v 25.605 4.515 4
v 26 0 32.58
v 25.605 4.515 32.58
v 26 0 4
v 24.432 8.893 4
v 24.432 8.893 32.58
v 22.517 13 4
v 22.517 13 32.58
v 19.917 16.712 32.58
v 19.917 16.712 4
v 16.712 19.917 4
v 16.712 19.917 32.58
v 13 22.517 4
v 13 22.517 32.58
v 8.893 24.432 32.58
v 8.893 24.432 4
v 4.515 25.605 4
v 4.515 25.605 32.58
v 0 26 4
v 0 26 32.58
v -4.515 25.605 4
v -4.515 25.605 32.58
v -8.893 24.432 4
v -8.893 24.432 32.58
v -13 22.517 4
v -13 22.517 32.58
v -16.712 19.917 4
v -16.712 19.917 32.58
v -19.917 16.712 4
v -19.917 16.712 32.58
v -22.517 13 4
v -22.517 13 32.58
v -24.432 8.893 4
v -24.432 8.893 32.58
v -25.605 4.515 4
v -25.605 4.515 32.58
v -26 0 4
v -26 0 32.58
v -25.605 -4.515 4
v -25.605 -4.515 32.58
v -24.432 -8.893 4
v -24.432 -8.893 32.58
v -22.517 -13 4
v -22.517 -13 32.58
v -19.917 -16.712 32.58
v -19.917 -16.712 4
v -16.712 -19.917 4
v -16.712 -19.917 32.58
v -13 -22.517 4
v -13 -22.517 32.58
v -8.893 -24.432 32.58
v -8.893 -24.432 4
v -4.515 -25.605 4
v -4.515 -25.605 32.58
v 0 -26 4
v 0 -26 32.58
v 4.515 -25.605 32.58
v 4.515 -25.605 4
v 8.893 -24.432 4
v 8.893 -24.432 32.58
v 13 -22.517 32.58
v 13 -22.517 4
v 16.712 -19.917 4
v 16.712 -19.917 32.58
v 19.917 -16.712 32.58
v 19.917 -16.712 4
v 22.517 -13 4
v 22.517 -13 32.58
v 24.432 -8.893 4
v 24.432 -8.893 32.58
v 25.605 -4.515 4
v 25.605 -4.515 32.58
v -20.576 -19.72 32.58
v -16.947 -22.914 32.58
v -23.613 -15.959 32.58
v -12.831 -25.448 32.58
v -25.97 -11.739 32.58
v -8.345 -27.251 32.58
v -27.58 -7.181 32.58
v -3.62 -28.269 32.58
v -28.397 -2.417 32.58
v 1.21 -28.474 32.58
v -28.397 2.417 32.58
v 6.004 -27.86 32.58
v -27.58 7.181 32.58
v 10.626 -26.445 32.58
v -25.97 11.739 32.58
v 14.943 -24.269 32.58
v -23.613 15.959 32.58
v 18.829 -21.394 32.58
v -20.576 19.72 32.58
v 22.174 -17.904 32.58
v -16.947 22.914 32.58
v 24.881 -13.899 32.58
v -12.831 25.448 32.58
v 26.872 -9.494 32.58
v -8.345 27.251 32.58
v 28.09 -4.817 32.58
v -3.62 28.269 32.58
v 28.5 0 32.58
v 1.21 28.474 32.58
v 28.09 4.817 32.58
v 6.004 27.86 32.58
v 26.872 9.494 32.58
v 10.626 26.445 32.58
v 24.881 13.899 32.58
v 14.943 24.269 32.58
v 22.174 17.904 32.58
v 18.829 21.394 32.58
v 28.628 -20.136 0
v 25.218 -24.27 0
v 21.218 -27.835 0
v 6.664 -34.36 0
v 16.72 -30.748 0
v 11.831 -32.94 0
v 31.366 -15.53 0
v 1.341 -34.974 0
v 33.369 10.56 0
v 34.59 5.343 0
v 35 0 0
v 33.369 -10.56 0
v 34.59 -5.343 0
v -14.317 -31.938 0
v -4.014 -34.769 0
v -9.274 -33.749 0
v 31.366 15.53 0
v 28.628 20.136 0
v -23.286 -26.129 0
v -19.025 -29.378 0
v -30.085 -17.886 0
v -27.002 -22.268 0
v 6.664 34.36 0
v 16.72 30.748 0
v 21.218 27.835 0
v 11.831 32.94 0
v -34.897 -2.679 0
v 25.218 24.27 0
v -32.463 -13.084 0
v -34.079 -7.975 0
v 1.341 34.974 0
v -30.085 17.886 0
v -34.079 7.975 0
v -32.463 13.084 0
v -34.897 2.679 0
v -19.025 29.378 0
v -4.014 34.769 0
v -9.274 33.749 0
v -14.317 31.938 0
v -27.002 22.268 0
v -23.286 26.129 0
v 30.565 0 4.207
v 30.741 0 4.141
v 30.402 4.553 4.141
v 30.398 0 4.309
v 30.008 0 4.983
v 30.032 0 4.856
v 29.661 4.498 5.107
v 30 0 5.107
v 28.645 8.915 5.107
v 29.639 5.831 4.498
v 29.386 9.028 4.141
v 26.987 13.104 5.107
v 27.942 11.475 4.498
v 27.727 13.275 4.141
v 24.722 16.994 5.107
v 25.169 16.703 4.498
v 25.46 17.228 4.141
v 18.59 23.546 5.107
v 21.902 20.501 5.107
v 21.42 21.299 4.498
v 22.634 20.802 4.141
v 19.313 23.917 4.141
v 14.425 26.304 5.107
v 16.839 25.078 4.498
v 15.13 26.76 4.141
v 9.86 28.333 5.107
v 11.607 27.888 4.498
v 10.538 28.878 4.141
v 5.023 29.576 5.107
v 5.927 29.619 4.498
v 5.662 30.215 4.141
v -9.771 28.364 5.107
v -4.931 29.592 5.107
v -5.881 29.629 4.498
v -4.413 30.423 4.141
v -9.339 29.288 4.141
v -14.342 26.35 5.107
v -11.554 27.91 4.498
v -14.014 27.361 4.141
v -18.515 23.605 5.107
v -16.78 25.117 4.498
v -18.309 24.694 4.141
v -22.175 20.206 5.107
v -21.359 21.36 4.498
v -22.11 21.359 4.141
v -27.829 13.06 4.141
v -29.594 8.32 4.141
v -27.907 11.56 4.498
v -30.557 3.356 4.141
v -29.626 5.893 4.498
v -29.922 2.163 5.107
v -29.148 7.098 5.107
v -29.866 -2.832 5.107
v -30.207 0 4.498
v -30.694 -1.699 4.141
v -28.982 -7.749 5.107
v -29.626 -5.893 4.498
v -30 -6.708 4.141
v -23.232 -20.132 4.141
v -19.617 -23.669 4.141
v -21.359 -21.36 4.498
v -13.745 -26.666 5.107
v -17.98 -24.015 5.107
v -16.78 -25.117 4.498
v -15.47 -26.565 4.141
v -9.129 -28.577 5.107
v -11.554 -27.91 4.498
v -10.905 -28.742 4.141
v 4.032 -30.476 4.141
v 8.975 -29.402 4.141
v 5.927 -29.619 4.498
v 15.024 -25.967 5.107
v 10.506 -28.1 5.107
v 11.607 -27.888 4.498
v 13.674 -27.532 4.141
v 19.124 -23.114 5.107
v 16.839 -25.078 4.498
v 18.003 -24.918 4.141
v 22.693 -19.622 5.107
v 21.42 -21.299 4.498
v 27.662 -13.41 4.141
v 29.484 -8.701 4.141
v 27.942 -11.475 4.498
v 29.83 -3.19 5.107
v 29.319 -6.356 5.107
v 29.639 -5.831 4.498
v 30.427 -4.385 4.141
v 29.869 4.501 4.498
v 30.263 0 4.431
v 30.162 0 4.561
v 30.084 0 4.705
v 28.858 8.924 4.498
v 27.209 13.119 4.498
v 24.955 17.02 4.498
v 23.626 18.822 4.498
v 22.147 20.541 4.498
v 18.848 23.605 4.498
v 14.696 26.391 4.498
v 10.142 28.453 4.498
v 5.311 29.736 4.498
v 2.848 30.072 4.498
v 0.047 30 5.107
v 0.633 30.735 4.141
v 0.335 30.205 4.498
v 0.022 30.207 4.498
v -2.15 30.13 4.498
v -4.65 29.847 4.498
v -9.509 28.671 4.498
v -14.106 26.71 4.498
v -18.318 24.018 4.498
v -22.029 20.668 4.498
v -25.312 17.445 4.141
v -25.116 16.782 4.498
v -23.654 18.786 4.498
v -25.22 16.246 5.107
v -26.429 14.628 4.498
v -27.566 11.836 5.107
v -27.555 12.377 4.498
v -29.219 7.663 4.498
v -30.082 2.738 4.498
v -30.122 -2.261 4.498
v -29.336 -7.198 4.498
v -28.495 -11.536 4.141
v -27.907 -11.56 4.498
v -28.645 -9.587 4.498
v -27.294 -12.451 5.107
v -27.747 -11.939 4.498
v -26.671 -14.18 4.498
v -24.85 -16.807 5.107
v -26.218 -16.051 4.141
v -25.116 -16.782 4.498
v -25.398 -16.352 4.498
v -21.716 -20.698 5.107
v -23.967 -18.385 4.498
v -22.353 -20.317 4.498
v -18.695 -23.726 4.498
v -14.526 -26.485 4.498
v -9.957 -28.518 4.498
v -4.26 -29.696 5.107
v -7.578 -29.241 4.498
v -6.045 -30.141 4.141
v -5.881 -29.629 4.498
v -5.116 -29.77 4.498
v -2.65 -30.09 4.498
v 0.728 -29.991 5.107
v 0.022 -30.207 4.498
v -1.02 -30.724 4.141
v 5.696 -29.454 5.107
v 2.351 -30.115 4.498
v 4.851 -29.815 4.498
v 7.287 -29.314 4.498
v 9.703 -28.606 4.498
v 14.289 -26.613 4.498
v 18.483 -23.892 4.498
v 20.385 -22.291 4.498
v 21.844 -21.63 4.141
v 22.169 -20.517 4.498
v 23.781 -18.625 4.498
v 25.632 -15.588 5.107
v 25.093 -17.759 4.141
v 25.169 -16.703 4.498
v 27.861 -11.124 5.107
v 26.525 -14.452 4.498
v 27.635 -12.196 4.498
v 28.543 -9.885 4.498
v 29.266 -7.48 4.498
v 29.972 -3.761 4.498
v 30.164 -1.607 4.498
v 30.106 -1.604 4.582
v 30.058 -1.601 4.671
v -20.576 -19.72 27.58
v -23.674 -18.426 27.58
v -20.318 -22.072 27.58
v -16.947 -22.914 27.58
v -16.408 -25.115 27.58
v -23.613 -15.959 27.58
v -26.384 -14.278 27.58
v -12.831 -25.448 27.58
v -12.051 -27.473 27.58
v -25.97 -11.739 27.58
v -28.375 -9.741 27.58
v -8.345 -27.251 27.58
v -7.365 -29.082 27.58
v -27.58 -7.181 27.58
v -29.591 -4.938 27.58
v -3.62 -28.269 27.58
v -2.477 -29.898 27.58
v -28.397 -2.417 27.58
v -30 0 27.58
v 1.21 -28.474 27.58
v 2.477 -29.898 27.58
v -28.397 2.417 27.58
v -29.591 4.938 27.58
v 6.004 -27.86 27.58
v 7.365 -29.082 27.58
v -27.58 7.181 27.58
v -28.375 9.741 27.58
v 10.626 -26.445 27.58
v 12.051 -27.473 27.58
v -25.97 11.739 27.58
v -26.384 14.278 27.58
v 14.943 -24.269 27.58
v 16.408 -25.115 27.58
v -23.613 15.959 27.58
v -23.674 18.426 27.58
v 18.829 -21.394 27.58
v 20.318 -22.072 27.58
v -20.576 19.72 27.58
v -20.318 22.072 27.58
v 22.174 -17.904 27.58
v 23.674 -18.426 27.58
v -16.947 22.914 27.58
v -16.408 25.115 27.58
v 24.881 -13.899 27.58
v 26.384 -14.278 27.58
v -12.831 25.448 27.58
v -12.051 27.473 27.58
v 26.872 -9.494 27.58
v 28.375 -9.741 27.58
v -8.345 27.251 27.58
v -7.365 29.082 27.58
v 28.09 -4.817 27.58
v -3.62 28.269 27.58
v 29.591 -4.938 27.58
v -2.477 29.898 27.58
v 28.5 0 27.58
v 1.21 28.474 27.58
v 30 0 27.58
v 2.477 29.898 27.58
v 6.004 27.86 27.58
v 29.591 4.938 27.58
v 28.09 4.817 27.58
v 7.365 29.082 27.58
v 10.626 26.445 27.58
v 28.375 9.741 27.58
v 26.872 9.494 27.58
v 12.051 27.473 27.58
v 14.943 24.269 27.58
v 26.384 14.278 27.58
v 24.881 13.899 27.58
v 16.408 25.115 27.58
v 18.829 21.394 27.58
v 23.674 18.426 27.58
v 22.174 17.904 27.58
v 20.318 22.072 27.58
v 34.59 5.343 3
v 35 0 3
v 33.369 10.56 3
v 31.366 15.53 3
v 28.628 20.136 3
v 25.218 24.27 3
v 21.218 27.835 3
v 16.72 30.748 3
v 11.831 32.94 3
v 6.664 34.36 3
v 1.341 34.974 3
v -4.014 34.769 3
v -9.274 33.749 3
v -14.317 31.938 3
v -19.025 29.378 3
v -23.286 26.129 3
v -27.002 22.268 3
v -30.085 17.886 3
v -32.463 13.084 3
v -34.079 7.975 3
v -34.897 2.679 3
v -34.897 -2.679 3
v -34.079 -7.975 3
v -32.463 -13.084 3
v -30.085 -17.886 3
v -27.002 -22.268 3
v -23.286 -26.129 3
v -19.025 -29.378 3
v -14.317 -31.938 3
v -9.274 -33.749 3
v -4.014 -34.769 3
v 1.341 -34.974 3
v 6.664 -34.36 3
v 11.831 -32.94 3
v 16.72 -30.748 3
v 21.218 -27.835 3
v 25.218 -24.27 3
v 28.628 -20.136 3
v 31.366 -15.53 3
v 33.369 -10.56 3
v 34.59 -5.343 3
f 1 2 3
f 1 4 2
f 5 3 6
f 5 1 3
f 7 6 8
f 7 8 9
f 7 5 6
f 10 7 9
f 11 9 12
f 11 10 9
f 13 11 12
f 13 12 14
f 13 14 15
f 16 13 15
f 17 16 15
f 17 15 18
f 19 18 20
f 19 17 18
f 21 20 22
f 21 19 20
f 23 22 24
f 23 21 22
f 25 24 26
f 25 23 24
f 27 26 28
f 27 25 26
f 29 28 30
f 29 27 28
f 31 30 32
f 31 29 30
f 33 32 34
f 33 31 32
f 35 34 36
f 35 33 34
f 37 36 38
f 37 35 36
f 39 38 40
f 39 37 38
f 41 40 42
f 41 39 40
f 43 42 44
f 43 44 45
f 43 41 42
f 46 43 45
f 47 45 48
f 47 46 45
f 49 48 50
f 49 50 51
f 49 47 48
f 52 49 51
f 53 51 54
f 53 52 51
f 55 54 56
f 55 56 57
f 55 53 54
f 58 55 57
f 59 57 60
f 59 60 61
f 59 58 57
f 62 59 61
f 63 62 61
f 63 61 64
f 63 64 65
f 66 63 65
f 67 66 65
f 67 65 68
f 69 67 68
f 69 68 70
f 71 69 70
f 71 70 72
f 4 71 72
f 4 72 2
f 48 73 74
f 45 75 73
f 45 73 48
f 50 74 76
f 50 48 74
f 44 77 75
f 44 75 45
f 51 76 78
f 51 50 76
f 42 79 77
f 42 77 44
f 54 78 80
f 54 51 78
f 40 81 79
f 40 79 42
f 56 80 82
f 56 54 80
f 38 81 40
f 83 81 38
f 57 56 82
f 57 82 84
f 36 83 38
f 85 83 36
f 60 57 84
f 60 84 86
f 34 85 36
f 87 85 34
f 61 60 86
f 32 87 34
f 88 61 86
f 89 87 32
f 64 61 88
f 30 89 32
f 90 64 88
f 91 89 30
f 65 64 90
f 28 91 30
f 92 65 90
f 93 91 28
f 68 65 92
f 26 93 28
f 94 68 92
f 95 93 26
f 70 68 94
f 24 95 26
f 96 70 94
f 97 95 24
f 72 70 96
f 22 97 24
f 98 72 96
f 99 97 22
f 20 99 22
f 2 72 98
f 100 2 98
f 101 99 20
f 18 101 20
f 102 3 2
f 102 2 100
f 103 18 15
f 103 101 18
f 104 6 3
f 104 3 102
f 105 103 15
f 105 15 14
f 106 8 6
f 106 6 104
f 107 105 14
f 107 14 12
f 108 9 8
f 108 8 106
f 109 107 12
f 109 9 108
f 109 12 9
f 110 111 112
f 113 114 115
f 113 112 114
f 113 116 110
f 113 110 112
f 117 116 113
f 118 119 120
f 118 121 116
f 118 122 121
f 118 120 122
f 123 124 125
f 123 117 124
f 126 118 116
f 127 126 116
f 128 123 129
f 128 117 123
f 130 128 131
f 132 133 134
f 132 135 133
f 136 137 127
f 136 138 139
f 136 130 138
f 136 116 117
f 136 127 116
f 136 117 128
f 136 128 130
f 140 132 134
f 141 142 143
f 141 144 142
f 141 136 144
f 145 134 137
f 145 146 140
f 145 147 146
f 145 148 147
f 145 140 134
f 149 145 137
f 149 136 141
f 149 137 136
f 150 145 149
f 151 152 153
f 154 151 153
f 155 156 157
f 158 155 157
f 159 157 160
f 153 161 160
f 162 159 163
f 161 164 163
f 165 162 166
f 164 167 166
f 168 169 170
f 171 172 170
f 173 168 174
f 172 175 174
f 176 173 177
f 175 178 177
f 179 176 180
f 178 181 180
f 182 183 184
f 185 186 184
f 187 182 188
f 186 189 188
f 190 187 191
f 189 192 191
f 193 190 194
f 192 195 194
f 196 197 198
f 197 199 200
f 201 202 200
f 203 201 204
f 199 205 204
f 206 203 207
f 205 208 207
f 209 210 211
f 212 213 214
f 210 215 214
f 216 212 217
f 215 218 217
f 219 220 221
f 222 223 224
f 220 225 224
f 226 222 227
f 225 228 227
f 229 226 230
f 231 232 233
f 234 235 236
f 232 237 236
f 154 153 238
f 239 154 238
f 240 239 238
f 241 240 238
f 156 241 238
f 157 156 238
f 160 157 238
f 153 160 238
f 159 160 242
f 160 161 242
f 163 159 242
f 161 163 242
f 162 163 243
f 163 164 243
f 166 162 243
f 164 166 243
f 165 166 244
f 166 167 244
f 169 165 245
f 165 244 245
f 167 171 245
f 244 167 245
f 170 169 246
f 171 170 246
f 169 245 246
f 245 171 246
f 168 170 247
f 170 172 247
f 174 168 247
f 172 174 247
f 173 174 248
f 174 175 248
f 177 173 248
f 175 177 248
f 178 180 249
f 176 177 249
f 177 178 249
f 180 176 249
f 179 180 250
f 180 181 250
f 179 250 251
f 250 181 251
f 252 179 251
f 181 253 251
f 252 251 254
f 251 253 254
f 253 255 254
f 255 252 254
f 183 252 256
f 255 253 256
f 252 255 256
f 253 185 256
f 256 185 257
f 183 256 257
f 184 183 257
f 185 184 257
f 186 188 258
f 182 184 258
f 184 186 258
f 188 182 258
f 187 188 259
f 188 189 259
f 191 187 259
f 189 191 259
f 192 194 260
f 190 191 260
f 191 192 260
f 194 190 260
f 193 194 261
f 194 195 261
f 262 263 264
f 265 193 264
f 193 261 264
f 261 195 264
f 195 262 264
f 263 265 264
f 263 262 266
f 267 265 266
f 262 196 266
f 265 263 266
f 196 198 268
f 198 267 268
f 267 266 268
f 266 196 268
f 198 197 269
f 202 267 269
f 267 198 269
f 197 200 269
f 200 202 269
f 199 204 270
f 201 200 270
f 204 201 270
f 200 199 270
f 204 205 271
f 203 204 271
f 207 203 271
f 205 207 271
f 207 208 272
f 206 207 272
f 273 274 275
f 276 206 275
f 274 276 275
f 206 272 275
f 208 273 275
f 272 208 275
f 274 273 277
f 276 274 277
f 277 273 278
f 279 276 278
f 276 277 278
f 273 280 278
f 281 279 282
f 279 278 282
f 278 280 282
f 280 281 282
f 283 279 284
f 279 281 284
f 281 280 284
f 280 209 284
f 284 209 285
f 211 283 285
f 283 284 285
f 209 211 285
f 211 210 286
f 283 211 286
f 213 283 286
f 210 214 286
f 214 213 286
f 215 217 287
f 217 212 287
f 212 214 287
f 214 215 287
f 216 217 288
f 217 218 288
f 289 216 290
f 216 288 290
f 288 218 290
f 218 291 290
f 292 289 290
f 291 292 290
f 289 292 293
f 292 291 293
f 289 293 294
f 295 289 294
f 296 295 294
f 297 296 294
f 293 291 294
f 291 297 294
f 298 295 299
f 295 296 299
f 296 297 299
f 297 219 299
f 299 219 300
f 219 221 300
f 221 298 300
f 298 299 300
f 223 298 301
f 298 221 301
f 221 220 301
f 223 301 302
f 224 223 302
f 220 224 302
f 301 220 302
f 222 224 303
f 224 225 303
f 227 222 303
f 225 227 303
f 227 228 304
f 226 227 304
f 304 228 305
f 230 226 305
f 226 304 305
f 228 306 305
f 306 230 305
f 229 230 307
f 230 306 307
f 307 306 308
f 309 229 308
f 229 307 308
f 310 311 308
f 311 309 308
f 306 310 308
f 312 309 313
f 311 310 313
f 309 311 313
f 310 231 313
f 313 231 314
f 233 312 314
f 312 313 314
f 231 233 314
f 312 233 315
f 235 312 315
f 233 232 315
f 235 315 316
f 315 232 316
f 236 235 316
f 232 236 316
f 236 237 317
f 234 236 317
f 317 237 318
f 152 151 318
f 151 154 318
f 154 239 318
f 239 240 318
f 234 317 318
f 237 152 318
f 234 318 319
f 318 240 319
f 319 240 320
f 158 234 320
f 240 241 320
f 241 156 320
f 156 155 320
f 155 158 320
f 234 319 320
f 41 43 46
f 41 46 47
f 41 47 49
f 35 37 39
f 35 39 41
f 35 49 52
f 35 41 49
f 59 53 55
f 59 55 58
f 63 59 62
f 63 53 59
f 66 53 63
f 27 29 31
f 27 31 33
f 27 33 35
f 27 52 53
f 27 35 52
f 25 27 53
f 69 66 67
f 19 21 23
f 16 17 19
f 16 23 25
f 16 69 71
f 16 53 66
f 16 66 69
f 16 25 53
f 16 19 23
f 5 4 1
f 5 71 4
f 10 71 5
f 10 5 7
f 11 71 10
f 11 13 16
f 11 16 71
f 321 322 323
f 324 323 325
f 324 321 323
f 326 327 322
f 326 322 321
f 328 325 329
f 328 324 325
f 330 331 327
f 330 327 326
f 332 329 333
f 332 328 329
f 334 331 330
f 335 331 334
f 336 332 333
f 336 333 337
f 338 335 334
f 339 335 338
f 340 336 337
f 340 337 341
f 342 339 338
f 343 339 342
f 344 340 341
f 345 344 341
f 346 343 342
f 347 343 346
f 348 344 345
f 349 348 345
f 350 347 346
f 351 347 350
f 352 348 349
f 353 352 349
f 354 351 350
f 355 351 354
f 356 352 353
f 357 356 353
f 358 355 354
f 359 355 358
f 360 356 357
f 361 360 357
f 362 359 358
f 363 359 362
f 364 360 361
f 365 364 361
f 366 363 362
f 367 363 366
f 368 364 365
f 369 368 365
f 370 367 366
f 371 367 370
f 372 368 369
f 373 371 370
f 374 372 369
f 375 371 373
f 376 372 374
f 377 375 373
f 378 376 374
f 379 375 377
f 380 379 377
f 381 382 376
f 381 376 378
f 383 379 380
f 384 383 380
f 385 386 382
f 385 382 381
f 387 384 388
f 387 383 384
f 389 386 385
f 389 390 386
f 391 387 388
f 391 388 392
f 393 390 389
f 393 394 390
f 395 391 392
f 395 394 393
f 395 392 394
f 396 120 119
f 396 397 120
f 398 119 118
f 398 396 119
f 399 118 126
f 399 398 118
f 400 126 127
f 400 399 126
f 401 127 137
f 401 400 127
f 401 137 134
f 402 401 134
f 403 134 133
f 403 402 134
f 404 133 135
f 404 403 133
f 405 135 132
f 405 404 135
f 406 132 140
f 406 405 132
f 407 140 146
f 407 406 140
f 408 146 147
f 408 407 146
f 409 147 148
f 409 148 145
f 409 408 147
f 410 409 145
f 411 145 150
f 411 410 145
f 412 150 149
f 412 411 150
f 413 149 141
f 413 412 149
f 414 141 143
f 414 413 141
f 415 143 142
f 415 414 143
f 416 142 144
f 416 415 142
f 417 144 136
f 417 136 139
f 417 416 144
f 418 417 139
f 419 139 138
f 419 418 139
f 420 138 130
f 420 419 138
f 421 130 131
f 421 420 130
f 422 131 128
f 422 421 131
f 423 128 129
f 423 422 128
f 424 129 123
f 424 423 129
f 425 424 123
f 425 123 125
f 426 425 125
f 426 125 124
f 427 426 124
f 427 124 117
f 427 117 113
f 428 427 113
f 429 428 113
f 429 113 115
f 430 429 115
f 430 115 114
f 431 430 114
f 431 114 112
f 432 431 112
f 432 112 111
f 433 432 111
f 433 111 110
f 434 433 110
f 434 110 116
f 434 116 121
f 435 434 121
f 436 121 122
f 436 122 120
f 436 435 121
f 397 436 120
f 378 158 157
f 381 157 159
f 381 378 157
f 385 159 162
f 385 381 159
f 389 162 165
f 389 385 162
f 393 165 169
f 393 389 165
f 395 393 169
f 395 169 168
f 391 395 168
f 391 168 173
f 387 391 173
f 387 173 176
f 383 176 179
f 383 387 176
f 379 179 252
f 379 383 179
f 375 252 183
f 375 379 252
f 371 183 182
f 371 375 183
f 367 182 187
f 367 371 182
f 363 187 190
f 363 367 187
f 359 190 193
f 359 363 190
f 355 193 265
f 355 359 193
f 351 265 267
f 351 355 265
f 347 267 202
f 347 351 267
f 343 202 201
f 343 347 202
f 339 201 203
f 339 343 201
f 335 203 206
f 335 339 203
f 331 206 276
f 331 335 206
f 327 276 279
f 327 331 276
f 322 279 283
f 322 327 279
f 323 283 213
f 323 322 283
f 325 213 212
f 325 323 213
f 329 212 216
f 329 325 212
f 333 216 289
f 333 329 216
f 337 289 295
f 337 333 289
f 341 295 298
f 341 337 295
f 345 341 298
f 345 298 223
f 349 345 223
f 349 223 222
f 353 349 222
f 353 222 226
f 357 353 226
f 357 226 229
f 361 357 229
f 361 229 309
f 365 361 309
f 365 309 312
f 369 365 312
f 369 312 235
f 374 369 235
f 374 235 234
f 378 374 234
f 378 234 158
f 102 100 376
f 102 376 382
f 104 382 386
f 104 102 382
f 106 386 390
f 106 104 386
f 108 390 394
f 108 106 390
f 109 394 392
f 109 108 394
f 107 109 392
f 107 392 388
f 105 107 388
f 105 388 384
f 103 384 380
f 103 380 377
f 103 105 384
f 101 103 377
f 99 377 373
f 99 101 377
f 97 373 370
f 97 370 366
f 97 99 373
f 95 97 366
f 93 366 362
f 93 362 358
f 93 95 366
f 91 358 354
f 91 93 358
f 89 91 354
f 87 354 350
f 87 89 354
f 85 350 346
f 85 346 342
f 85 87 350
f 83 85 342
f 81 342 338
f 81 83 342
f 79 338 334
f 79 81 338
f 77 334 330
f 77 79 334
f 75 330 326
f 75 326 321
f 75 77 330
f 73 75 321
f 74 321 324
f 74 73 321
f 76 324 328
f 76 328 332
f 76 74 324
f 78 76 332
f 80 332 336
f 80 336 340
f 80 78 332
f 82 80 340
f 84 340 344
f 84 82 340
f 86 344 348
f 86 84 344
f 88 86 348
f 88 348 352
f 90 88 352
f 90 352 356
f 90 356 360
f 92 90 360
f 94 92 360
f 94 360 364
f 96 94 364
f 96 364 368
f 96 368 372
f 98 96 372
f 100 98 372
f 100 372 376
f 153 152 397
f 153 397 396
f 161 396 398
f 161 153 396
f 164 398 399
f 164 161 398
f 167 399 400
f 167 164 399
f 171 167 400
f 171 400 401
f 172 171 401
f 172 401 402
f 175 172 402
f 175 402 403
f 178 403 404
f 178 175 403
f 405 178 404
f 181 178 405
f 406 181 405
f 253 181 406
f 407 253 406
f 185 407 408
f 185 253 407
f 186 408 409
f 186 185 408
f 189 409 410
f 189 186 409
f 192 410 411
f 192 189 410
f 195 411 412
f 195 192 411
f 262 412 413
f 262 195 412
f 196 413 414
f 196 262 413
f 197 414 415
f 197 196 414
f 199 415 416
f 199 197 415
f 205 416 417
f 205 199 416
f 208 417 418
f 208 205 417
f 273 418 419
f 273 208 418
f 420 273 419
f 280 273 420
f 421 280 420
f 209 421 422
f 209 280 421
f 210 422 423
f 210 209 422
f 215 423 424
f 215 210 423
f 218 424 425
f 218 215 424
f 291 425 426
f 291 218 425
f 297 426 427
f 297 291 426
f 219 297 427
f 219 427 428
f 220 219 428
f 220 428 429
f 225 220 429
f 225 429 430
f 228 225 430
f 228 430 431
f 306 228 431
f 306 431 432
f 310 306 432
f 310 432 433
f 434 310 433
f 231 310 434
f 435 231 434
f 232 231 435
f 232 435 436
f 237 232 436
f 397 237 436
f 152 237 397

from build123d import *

# Parameters (mm, degrees)
F2_R     = 30
F2_R_2   = 28.5
F3_DEPTH = 5
F4_R     = 1


with BuildPart() as f1:
    # F0 (on Front) → F1 (revolve)
    with BuildSketch(Plane.XZ):
        Polygon((0, 4), (0, 0), (35, 0), (35, 3), (30, 4.339746), (30, 32.57956), (26, 32.57956), (26, 4), align=None)
    revolve(axis=Axis((0, 0, 16.28978), (0, 0, 1)))

    # F2 (on face) → F3 (cut)
    with BuildSketch(Plane.XY.offset(32.57956)):
        Circle(F2_R)
        Circle(F2_R_2, mode=Mode.SUBTRACT)
    extrude(amount=-F3_DEPTH, mode=Mode.SUBTRACT)

    # F4
    f4_edges = [f1.edges().sort_by_distance(p)[0] for p in [
        (-30, 0, 4.339746),
    ]]
    fillet(f4_edges, radius=F4_R)


solid = f1.part
